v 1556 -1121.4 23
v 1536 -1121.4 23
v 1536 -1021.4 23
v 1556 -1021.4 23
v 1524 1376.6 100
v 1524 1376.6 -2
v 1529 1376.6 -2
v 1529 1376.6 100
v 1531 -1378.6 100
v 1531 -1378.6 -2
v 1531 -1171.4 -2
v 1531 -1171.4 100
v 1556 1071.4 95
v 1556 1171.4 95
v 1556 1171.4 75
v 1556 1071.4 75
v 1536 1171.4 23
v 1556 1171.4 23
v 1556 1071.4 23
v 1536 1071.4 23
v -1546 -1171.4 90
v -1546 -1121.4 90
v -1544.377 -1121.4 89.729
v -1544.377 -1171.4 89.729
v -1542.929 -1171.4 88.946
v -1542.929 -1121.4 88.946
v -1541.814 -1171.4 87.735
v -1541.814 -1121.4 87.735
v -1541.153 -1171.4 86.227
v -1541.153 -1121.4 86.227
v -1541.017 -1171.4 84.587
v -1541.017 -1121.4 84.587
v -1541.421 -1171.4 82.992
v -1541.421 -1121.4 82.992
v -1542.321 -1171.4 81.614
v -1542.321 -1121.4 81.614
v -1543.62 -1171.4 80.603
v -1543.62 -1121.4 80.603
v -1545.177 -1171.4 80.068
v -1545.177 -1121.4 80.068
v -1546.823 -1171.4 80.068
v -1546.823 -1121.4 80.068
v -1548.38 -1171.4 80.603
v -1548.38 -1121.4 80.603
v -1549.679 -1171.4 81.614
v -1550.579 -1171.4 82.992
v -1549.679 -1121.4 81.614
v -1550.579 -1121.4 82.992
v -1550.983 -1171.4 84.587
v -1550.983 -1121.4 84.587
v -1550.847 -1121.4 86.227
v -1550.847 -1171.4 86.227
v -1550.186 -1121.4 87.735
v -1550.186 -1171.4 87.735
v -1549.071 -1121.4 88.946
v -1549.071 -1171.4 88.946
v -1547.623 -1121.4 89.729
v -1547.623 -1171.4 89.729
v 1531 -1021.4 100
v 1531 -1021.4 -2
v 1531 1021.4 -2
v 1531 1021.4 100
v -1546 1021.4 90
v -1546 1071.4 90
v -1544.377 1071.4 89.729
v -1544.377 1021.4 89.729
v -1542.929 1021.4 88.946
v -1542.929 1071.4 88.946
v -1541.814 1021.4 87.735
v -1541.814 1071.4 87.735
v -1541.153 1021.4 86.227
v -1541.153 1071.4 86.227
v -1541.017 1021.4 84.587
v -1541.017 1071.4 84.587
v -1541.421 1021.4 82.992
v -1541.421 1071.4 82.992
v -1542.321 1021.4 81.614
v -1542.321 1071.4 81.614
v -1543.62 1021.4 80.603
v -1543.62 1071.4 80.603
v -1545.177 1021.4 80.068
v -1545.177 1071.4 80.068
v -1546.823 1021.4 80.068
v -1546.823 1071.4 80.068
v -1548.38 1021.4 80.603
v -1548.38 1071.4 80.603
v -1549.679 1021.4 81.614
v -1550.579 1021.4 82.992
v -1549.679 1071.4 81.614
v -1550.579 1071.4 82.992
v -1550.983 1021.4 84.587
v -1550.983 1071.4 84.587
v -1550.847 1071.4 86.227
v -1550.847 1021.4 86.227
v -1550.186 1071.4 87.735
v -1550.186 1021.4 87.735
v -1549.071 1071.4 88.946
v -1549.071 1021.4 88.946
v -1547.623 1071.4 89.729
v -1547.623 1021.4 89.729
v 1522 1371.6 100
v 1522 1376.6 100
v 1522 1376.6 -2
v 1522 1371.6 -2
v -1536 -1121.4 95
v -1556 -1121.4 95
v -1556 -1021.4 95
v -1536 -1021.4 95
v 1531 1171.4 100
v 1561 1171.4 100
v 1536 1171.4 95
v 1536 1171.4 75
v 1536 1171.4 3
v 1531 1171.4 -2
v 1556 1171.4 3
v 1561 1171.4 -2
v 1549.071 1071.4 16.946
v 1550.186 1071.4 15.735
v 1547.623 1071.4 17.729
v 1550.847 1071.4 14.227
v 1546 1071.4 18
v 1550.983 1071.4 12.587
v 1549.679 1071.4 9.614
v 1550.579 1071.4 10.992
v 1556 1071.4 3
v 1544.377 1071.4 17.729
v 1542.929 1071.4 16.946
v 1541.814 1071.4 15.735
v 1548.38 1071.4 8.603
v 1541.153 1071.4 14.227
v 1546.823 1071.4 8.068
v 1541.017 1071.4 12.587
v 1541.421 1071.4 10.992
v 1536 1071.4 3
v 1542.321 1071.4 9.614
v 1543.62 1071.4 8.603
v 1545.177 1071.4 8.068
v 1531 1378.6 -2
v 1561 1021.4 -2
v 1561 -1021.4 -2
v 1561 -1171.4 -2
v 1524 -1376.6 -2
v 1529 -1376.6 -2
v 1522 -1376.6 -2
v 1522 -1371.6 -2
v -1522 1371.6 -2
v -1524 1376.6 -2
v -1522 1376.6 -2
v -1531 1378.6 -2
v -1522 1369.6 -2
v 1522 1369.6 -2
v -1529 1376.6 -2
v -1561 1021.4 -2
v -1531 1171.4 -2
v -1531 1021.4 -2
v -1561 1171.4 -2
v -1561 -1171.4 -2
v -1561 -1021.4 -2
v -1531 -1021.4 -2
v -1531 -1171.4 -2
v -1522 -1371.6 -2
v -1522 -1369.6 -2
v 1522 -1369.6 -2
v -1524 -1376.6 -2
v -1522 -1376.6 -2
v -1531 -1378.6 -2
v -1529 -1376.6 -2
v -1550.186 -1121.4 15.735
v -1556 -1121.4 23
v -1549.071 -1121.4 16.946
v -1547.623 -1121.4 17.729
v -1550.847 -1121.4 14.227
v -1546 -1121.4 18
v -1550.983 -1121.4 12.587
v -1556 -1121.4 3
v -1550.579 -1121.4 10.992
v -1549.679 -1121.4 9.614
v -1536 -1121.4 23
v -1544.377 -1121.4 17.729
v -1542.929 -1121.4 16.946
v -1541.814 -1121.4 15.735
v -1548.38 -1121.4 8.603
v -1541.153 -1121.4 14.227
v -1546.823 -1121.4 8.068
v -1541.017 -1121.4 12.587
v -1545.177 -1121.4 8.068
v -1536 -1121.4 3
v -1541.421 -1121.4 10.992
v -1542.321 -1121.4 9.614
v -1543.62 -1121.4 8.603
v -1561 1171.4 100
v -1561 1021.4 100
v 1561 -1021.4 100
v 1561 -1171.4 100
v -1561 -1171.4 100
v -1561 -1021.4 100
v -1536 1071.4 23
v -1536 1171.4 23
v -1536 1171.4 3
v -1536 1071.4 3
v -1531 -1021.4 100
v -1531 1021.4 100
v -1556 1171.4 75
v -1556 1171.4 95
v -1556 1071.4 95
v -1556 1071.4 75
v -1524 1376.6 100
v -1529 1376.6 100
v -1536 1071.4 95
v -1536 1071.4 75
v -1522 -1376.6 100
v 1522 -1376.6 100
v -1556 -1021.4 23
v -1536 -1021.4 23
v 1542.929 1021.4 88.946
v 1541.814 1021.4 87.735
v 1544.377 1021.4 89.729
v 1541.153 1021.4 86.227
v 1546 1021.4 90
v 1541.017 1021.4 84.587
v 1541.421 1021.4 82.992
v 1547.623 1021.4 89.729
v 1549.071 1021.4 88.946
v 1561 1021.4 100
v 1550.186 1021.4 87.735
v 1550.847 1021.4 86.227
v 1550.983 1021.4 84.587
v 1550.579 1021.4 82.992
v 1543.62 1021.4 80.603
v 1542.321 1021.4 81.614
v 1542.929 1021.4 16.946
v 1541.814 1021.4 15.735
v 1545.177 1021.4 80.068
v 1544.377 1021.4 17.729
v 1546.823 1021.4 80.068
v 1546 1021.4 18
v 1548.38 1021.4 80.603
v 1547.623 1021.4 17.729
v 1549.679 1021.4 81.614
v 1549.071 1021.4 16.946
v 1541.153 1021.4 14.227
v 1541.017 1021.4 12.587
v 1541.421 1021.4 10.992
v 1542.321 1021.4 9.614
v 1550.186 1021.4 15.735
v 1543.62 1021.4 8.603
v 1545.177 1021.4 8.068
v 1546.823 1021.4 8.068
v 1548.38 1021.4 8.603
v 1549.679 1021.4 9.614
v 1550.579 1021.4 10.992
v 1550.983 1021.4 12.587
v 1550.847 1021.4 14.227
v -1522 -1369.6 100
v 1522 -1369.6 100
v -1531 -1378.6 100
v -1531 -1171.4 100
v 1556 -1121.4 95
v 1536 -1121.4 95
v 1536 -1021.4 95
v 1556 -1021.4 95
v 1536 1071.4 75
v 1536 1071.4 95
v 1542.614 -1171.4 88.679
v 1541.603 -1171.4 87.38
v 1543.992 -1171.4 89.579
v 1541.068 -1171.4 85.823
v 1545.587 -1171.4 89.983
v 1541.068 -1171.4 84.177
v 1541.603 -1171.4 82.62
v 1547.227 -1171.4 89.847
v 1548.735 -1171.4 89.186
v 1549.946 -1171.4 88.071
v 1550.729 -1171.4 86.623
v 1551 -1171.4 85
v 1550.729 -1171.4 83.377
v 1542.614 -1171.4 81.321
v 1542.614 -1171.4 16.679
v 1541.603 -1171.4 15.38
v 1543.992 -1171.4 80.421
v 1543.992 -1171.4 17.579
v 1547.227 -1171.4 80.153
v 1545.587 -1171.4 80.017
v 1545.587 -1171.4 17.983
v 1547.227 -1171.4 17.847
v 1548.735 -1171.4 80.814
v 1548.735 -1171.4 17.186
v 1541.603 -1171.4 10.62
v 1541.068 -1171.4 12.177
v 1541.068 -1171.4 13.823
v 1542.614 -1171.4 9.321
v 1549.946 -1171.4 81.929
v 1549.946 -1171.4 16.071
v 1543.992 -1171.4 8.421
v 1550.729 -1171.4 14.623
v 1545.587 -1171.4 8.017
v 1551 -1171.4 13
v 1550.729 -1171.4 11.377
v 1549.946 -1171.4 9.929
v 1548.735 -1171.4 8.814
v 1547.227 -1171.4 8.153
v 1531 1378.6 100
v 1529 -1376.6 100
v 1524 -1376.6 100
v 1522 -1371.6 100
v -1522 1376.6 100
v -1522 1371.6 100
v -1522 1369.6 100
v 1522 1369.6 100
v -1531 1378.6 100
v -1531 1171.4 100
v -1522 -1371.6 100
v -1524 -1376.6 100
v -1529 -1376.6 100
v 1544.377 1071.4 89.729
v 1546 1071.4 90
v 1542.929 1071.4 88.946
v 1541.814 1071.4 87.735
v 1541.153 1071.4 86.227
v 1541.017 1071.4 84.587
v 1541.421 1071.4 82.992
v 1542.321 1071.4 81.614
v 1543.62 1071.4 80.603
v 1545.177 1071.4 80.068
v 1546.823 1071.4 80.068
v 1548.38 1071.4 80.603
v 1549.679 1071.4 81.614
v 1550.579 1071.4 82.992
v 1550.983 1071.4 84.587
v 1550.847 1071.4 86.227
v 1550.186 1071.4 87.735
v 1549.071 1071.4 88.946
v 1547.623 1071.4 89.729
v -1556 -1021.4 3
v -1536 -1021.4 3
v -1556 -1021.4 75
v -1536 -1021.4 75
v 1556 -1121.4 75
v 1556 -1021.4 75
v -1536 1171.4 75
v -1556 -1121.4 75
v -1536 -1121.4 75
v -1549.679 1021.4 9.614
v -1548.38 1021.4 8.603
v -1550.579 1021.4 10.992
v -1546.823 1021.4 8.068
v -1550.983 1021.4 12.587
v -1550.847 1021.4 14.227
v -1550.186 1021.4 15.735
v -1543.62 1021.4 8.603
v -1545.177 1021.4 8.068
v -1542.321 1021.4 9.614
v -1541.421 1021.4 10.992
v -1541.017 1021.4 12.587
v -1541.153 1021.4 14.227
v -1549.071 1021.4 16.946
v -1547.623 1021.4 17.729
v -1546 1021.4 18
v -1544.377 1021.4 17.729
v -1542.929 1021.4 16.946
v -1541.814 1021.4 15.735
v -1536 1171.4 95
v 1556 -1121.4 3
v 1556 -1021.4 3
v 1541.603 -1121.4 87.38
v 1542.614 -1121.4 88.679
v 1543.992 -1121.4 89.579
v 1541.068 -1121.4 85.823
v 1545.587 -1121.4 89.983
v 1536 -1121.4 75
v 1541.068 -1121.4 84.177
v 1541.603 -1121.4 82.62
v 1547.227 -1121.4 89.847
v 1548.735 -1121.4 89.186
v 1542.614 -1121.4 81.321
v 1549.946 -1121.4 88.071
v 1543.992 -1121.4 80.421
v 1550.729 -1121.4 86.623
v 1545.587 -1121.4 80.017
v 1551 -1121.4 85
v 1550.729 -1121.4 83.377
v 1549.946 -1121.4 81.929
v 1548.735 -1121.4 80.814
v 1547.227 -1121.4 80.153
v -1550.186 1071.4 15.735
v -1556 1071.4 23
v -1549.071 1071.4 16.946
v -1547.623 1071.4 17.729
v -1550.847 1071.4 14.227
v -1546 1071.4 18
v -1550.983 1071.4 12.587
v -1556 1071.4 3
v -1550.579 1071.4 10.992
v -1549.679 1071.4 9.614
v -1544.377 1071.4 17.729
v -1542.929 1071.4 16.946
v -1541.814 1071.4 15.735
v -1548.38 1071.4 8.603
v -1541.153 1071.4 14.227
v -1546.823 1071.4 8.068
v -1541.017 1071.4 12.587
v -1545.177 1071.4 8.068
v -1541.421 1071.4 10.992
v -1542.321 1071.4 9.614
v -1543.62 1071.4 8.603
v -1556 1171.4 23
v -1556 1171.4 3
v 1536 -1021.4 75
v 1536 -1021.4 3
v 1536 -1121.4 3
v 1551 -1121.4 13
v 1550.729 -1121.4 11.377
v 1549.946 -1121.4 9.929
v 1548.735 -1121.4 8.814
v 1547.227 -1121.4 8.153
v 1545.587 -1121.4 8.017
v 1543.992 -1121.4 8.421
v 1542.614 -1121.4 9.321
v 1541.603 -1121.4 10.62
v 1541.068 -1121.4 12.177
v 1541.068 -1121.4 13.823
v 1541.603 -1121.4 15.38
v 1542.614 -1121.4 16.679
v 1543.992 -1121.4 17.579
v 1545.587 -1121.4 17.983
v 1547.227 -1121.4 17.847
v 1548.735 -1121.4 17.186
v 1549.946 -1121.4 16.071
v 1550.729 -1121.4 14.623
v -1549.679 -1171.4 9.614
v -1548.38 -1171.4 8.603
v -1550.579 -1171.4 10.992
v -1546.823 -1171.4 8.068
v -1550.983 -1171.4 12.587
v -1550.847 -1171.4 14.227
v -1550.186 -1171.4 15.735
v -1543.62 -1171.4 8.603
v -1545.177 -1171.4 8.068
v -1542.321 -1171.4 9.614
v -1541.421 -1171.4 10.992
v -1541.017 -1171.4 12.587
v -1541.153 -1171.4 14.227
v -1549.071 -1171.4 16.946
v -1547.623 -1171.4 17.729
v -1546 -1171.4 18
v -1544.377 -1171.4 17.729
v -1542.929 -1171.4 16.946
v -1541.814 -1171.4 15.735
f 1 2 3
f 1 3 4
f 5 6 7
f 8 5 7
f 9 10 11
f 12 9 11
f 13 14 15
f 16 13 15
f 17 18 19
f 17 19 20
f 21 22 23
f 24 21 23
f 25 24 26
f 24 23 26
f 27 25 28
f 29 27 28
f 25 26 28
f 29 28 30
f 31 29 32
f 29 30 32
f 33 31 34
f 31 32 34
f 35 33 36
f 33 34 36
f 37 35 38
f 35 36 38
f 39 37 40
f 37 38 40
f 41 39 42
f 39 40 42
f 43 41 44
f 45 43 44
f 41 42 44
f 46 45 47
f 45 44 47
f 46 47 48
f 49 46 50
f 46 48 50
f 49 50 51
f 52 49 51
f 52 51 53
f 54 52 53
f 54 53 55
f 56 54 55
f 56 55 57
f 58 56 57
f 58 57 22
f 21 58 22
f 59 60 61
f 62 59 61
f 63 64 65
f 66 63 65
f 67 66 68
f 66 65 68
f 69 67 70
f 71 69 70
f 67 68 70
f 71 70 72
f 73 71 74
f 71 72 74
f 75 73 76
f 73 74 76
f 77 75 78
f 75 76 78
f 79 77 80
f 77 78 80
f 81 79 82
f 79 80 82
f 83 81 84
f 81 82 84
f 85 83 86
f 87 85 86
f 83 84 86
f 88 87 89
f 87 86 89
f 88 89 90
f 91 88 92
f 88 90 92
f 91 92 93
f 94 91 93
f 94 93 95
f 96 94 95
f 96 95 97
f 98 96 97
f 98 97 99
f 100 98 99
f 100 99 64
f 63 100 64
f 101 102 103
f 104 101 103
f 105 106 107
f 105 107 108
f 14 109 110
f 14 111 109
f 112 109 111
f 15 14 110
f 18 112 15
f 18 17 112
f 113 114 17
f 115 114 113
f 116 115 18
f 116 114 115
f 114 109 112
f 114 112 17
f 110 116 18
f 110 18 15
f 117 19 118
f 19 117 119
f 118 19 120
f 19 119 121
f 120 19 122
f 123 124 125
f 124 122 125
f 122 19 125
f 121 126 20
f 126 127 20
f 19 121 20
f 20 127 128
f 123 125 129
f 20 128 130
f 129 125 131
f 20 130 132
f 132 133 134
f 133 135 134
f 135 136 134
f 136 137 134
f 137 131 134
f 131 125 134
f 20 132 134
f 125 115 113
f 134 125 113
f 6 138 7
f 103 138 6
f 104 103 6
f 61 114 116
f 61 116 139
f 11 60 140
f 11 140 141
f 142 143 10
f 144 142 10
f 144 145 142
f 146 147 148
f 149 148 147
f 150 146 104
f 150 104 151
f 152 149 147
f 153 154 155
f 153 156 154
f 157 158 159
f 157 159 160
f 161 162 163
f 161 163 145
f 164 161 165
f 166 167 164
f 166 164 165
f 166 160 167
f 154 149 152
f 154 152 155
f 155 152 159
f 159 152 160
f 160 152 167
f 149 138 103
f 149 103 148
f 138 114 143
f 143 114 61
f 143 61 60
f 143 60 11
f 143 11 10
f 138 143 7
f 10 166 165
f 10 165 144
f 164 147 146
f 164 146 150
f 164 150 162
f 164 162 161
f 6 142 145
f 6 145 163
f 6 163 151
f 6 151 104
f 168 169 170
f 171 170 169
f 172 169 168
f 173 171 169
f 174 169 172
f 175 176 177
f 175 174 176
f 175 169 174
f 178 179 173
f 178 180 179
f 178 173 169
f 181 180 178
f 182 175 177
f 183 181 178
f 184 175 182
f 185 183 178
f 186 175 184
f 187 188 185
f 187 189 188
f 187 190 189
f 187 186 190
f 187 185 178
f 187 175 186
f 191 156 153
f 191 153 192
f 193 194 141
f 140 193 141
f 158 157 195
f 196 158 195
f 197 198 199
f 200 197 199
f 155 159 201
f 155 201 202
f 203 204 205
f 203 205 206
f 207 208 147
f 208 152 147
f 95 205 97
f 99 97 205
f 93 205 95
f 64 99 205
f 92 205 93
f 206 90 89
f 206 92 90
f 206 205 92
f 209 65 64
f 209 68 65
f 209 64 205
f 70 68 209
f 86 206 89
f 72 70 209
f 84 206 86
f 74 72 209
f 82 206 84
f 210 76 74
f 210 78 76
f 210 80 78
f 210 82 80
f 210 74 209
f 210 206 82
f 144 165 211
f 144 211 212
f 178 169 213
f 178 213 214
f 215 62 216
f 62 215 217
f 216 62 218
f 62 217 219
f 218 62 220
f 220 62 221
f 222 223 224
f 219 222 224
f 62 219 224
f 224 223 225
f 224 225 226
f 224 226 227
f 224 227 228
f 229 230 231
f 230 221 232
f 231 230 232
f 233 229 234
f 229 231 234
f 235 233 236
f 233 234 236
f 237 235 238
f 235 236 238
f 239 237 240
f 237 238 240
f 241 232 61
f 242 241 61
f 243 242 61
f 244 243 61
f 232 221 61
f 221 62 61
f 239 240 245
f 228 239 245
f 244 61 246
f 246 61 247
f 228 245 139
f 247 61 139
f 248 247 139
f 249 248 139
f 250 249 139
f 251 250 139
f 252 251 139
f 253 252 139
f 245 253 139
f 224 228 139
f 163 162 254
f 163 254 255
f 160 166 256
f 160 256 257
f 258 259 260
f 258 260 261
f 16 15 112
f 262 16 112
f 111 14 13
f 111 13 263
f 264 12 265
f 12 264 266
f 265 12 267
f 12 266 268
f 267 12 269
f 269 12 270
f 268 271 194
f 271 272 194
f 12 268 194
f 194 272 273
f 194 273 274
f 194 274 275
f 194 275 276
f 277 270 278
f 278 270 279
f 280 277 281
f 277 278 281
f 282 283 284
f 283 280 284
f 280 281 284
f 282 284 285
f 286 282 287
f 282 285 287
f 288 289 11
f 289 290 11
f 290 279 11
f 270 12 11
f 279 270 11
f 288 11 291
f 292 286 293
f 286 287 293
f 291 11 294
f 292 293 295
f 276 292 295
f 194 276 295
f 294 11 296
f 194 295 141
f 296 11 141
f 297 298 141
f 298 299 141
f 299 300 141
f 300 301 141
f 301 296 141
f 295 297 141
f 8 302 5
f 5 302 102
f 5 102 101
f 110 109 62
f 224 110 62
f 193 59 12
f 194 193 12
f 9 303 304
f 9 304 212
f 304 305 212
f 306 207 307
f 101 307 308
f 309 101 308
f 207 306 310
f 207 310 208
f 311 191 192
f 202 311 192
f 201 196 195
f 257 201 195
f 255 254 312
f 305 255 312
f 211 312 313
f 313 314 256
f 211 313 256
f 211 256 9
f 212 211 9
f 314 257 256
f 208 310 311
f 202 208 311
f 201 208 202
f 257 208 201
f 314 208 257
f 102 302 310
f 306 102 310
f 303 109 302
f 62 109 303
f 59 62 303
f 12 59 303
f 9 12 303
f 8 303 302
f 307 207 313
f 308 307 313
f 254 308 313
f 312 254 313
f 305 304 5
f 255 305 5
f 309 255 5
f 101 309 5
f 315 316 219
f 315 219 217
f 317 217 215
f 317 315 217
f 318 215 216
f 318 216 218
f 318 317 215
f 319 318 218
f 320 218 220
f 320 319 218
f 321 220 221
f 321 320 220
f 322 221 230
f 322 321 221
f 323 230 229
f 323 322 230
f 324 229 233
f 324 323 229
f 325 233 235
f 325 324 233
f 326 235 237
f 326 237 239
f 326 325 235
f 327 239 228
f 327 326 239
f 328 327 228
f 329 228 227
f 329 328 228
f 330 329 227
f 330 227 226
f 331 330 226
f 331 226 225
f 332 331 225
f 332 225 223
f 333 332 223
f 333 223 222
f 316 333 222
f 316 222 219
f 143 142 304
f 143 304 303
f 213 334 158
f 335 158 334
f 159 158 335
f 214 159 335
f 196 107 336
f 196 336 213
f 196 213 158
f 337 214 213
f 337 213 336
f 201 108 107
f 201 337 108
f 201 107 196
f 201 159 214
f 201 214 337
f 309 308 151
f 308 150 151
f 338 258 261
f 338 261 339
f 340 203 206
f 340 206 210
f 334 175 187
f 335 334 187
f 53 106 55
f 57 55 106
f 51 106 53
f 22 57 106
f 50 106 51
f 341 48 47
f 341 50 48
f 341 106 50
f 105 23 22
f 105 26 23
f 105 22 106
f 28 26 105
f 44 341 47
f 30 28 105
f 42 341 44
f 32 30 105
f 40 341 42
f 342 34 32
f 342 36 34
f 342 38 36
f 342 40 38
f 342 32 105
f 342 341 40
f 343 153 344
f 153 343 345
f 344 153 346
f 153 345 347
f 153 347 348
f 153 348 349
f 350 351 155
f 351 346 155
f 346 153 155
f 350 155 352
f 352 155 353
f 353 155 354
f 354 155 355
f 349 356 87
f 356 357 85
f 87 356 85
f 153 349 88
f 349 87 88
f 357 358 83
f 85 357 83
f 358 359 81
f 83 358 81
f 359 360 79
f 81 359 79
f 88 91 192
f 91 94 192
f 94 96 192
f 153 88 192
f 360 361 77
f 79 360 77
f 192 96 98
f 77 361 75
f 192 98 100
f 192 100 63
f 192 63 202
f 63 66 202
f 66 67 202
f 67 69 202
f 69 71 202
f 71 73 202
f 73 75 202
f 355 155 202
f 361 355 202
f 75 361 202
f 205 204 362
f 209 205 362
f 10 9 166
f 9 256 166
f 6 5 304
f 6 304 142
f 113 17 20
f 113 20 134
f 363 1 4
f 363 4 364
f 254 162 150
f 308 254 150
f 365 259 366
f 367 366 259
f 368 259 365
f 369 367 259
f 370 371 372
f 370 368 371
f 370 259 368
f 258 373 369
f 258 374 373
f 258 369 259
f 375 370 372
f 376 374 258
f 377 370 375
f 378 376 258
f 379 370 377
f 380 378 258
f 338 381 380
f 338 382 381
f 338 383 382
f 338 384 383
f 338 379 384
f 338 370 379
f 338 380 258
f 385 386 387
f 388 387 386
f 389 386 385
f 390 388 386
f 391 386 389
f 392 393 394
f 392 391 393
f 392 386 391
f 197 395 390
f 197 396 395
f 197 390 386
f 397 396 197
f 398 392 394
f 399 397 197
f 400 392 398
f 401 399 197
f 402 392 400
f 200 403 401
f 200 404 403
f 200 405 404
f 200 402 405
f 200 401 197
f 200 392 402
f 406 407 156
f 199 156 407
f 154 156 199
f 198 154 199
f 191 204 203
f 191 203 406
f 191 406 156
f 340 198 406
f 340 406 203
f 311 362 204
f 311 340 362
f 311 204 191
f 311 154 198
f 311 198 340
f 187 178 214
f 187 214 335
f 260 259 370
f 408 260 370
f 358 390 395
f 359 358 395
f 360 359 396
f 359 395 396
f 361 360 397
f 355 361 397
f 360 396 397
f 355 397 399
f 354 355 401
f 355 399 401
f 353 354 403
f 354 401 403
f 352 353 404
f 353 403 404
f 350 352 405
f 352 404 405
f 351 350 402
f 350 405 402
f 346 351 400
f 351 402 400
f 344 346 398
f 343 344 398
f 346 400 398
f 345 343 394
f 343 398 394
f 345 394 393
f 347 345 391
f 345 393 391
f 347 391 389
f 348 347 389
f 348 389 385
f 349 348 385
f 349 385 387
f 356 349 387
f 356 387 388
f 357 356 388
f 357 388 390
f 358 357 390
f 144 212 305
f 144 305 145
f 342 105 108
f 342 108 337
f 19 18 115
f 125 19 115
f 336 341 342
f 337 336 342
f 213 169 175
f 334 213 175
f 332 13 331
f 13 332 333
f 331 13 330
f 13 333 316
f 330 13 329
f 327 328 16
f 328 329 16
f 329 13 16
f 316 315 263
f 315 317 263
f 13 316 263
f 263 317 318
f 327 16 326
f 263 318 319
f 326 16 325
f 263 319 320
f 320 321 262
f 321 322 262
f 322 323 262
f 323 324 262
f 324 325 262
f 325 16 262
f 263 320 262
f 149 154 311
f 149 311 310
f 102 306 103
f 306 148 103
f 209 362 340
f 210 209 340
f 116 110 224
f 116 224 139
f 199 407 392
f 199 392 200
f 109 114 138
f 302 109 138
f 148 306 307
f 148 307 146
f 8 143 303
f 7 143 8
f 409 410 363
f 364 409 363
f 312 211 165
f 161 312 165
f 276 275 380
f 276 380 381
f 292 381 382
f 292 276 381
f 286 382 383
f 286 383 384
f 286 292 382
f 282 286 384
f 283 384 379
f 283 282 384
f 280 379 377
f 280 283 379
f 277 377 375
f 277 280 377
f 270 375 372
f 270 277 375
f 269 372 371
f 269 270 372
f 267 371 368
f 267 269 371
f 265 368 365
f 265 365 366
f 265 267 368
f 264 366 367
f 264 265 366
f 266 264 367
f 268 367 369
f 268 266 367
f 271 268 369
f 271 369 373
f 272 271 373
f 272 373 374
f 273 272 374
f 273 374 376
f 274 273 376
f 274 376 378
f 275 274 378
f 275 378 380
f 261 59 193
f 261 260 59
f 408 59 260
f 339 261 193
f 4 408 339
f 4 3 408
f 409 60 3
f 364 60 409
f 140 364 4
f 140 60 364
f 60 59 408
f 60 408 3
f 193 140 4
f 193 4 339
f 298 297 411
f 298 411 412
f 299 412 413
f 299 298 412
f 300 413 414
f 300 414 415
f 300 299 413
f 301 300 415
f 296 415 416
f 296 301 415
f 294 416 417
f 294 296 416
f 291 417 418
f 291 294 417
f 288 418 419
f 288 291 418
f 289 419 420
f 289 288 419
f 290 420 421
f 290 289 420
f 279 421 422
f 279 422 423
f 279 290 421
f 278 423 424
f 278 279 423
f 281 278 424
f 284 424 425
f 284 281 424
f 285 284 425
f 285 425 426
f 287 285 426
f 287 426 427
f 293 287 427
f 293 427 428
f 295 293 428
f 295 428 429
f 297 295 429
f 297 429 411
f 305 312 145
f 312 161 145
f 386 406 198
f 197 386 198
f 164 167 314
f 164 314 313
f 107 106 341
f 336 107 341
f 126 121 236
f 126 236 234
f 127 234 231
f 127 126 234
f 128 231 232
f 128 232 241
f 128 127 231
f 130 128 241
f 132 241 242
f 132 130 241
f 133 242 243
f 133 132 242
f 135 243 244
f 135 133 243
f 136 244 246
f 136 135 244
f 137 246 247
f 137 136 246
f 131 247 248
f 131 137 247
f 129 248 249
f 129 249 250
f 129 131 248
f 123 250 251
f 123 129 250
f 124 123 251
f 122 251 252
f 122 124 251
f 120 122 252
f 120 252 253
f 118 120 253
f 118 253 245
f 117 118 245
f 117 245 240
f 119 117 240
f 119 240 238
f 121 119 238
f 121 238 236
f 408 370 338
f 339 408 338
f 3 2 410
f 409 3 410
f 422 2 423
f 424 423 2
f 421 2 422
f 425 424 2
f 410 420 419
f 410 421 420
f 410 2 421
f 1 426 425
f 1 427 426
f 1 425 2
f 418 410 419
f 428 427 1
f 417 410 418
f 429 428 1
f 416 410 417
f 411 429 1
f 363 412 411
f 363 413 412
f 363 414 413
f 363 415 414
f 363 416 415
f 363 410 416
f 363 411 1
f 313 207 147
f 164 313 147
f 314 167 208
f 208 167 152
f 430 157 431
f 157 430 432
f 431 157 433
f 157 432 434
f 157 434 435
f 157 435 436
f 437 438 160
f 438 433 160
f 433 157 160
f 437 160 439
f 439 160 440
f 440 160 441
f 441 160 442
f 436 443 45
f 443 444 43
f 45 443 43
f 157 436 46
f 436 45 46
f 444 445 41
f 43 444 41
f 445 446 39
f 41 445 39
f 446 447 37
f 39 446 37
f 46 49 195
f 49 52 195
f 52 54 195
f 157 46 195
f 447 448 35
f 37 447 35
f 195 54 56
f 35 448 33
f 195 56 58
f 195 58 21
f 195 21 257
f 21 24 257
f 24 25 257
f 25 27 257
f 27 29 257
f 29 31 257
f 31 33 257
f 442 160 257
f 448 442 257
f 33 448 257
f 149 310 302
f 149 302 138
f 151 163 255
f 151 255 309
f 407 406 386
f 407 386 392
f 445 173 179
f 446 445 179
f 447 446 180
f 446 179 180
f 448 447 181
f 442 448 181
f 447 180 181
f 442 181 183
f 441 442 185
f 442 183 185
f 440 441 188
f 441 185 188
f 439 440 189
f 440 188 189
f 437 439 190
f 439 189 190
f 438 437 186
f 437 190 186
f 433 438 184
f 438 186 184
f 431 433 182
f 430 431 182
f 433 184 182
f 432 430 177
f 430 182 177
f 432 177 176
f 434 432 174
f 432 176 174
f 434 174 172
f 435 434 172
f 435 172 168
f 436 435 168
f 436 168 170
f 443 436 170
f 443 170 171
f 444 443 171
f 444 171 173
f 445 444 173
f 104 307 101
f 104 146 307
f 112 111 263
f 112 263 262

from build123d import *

# Parameters (mm, degrees)
SKETCH1_W               = 3058
SKETCH1_H               = 2753.2
SKETCH1_W_2             = 3048
SKETCH1_H_2             = 2743.2
BOSS_EXTRUDE1_DEPTH     = 100
SHELL4_T                = 2
SKETCH2_W               = 3058
SKETCH2_H               = 2753.2
SKETCH2_W_2             = 3048
SKETCH2_H_2             = 2743.2
CUT_EXTRUDE5_DEPTH      = 5
SKETCH3_W               = 102
SKETCH3_H               = 150
BOSS_EXTRUDE2_DEPTH     = 30
SKETCH4_W               = 20
SKETCH4_H               = 20
CUT_EXTRUDE6_DEPTH      = 100
SKETCH5_R               = 5
CUT_EXTRUDE7_DEPTH      = 50
SKETCH7_W               = 20
SKETCH7_H               = 20
CUT_EXTRUDE9_DEPTH      = 100
SKETCH9_R               = 5
CUT_EXTRUDE10_DEPTH     = 50
SKETCH8_R               = 5
CUT_EXTRUDE11_DEPTH     = 50
MIRROR2_START           = 1021.4
MIRROR2_OUTLINE_W       = 30
MIRROR2_OUTLINE_H       = 102
MIRROR2_DEPTH           = 150
MIRROR2_START_2         = -1171.4
MIRROR2_2_OUTLINE_W     = 30
MIRROR2_2_OUTLINE_H     = 102
MIRROR2_2_OUTLINE_W_2   = 20
MIRROR2_2_OUTLINE_H_2   = 20
MIRROR2_2_DEPTH         = 150
MIRROR2_3_OUTLINE_W     = 20
MIRROR2_3_OUTLINE_H     = 20
MIRROR2_3_OUTLINE_R     = 5
MIRROR2_3_DEPTH         = 50
SKETCH10_W              = 102
SKETCH10_H              = 7
BOSS_EXTRUDE3_DEPTH     = 2
MIRROR5_COPY_1_SKETCH_W = 102
MIRROR5_COPY_1_SKETCH_H = 7
MIRROR5_COPY_1_DEPTH    = 2


with BuildPart() as part:
    # Sketch1 → Boss-Extrude1 (new body)
    with BuildSketch(Plane.XY):
        Rectangle(SKETCH1_W, SKETCH1_H)
        Rectangle(SKETCH1_W_2, SKETCH1_H_2, mode=Mode.SUBTRACT)
    extrude(amount=BOSS_EXTRUDE1_DEPTH)

    # Shell4
    shell4_openings = [part.faces().sort_by_distance(p)[0] for p in [
        (-1524.885212735, 0, 100),
    ]]
    offset(amount=SHELL4_T, openings=shell4_openings, kind=Kind.INTERSECTION)

    # Sketch2 → Cut-Extrude5 (cut, symmetric)
    with BuildSketch(Plane.XY):
        Rectangle(SKETCH2_W, SKETCH2_H)
        Rectangle(SKETCH2_W_2, SKETCH2_H_2, mode=Mode.SUBTRACT)
    extrude(amount=CUT_EXTRUDE5_DEPTH, both=True, mode=Mode.SUBTRACT)


with BuildPart() as cut_extrude5_piece_1:
    # of the separate pieces the step leaves, piece 1, a body of its own (cut_extrude5_pieces)
    add(part.part.solids().sort_by_distance((-1529, -1376.6, -2))[0])

    # Sketch3 → Boss-Extrude2 (add)
    with BuildSketch(Plane.ZY.offset(1531)):
        with Locations((49, 1096.4)):
            Rectangle(SKETCH3_W, SKETCH3_H)
    boss_extrude2 = extrude(amount=BOSS_EXTRUDE2_DEPTH)

    # Mirror1: Boss-Extrude2 across plane
    add(boss_extrude2.mirror(Plane.ZX))

    # Sketch4 → Cut-Extrude6 (cut)
    with BuildSketch(Plane(origin=(0, 1171.4, 0), x_dir=(1, 0, 0), z_dir=(0, 1, 0))):
        with Locations((-1546, -85)):
            Rectangle(SKETCH4_W, SKETCH4_H)
        with Locations((-1546, -13)):
            Rectangle(SKETCH4_W, SKETCH4_H)
    cut_extrude6 = extrude(amount=-CUT_EXTRUDE6_DEPTH, mode=Mode.SUBTRACT)

    # Sketch5 → Cut-Extrude7 (cut)
    with BuildSketch(Plane(origin=(0, 1071.4, 0), x_dir=(1, 0, 0), z_dir=(0, 1, 0))):
        with Locations(Location((-1546, -85, 0), (0, 0, 270))):
            Circle(SKETCH5_R)
        with Locations(Location((-1546, -13, 0), (0, 0, 270))):
            Circle(SKETCH5_R)
    cut_extrude7 = extrude(amount=-CUT_EXTRUDE7_DEPTH, mode=Mode.SUBTRACT)

    # Sketch7 → Cut-Extrude9 (cut)
    with BuildSketch(Plane(origin=(0, -1021.4, 0), x_dir=(1, 0, 0), z_dir=(0, 1, 0))):
        with Locations((-1546, -85)):
            Rectangle(SKETCH7_W, SKETCH7_H)
        with Locations((-1546, -13)):
            Rectangle(SKETCH7_W, SKETCH7_H)
    extrude(amount=-CUT_EXTRUDE9_DEPTH, mode=Mode.SUBTRACT)

    # Sketch9 → Cut-Extrude10 (cut)
    with BuildSketch(Plane(origin=(0, -1121.4, 0), x_dir=(1, 0, 0), z_dir=(0, 1, 0))):
        with Locations(Location((-1546, -13, 0), (0, 0, 270))):
            Circle(SKETCH9_R)
    extrude(amount=-CUT_EXTRUDE10_DEPTH, mode=Mode.SUBTRACT)

    # Sketch8 → Cut-Extrude11 (cut)
    with BuildSketch(Plane(origin=(0, -1121.4, 0), x_dir=(1, 0, 0), z_dir=(0, 1, 0))):
        with Locations(Location((-1546, -85, 0), (0, 0, 270))):
            Circle(SKETCH8_R)
    extrude(amount=-CUT_EXTRUDE11_DEPTH, mode=Mode.SUBTRACT)

    # Mirror2: read off the stored shape, not the designer's step
    # Mirror2 outline → Mirror2 (add)
    with BuildSketch(Plane(origin=(0, 0, 0), x_dir=(1, 0, 0), z_dir=(0, 1, 0)).offset(MIRROR2_START)):
        with Locations((1546, -49)):
            Rectangle(MIRROR2_OUTLINE_W, MIRROR2_OUTLINE_H)
    extrude(amount=MIRROR2_DEPTH)

    # Mirror2 2 outline → Mirror2 2 (add)
    with BuildSketch(Plane(origin=(0, 0, 0), x_dir=(1, 0, 0), z_dir=(0, 1, 0)).offset(MIRROR2_START_2)):
        with Locations((1546, -49)):
            Rectangle(MIRROR2_2_OUTLINE_W, MIRROR2_2_OUTLINE_H)
        with Locations((1546, -85)):
            Rectangle(MIRROR2_2_OUTLINE_W_2, MIRROR2_2_OUTLINE_H_2, mode=Mode.SUBTRACT)
        with Locations((1546, -13)):
            Rectangle(MIRROR2_2_OUTLINE_W_2, MIRROR2_2_OUTLINE_H_2, mode=Mode.SUBTRACT)
    extrude(amount=MIRROR2_2_DEPTH)

    # Mirror2 3 outline → Mirror2 3 (add)
    # profile 1 of 2: a face of its own
    with BuildSketch(Plane(origin=(0, 0, 0), x_dir=(1, 0, 0), z_dir=(0, 1, 0)).offset(MIRROR2_START_2)):
        with Locations((1546, -85)):
            Rectangle(MIRROR2_3_OUTLINE_W, MIRROR2_3_OUTLINE_H)
        with Locations((1546, -85)):
            Circle(MIRROR2_3_OUTLINE_R, mode=Mode.SUBTRACT)
    # profile 2 of 2: a face of its own
    with BuildSketch(Plane(origin=(0, 0, 0), x_dir=(1, 0, 0), z_dir=(0, 1, 0)).offset(MIRROR2_START_2)):
        with Locations((1546, -13)):
            Rectangle(MIRROR2_3_OUTLINE_W, MIRROR2_3_OUTLINE_H)
        with Locations((1546, -13)):
            Circle(MIRROR2_3_OUTLINE_R, mode=Mode.SUBTRACT)
    extrude(amount=MIRROR2_3_DEPTH)

    # Mirror3: Cut-Extrude6, Cut-Extrude7 across plane
    add(cut_extrude6.mirror(Plane(origin=(0, 0, 0), x_dir=(0, 0, 1), z_dir=(1, 0, 0))), mode=Mode.SUBTRACT)
    add(cut_extrude7.mirror(Plane(origin=(0, 0, 0), x_dir=(0, 0, 1), z_dir=(1, 0, 0))), mode=Mode.SUBTRACT)



with BuildPart() as cut_extrude5_piece_2:
    # of the separate pieces the step leaves, piece 2, a body of its own (cut_extrude5_pieces)
    add(part.part.solids().sort_by_distance((-1524, 1371.6, -2))[0])


with BuildPart() as cut_extrude5_piece_1_1:
    add(cut_extrude5_piece_1.part)

    add(cut_extrude5_piece_2.part)  # Boss-Extrude3 merges Cut-Extrude5 piece 2
    # Sketch10 → Boss-Extrude3 (add)
    with BuildSketch(Plane(origin=(1524, 0, 0), x_dir=(0, 0, -1), z_dir=(1, 0, 0))):
        with Locations((-49, 1375.1)):
            Rectangle(SKETCH10_W, SKETCH10_H)
    boss_extrude3 = extrude(amount=-BOSS_EXTRUDE3_DEPTH)

    # Mirror4: Boss-Extrude3 across plane
    add(boss_extrude3.mirror(Plane.ZX))

    # Mirror5: Boss-Extrude3 across plane
    add(boss_extrude3.mirror(Plane(origin=(0, 0, 0), x_dir=(0, 0, 1), z_dir=(1, 0, 0))))

    # Mirror5 copy 1 sketch → Mirror5 copy 1 (add)
    with BuildSketch(Plane(origin=(-1524, 0, 0), x_dir=(0, 0, -1), z_dir=(-1, 0, 0))):
        with Locations((-49, 1375.1)):
            Rectangle(MIRROR5_COPY_1_SKETCH_W, MIRROR5_COPY_1_SKETCH_H)
    extrude(amount=-MIRROR5_COPY_1_DEPTH)


solid = cut_extrude5_piece_1_1.part
